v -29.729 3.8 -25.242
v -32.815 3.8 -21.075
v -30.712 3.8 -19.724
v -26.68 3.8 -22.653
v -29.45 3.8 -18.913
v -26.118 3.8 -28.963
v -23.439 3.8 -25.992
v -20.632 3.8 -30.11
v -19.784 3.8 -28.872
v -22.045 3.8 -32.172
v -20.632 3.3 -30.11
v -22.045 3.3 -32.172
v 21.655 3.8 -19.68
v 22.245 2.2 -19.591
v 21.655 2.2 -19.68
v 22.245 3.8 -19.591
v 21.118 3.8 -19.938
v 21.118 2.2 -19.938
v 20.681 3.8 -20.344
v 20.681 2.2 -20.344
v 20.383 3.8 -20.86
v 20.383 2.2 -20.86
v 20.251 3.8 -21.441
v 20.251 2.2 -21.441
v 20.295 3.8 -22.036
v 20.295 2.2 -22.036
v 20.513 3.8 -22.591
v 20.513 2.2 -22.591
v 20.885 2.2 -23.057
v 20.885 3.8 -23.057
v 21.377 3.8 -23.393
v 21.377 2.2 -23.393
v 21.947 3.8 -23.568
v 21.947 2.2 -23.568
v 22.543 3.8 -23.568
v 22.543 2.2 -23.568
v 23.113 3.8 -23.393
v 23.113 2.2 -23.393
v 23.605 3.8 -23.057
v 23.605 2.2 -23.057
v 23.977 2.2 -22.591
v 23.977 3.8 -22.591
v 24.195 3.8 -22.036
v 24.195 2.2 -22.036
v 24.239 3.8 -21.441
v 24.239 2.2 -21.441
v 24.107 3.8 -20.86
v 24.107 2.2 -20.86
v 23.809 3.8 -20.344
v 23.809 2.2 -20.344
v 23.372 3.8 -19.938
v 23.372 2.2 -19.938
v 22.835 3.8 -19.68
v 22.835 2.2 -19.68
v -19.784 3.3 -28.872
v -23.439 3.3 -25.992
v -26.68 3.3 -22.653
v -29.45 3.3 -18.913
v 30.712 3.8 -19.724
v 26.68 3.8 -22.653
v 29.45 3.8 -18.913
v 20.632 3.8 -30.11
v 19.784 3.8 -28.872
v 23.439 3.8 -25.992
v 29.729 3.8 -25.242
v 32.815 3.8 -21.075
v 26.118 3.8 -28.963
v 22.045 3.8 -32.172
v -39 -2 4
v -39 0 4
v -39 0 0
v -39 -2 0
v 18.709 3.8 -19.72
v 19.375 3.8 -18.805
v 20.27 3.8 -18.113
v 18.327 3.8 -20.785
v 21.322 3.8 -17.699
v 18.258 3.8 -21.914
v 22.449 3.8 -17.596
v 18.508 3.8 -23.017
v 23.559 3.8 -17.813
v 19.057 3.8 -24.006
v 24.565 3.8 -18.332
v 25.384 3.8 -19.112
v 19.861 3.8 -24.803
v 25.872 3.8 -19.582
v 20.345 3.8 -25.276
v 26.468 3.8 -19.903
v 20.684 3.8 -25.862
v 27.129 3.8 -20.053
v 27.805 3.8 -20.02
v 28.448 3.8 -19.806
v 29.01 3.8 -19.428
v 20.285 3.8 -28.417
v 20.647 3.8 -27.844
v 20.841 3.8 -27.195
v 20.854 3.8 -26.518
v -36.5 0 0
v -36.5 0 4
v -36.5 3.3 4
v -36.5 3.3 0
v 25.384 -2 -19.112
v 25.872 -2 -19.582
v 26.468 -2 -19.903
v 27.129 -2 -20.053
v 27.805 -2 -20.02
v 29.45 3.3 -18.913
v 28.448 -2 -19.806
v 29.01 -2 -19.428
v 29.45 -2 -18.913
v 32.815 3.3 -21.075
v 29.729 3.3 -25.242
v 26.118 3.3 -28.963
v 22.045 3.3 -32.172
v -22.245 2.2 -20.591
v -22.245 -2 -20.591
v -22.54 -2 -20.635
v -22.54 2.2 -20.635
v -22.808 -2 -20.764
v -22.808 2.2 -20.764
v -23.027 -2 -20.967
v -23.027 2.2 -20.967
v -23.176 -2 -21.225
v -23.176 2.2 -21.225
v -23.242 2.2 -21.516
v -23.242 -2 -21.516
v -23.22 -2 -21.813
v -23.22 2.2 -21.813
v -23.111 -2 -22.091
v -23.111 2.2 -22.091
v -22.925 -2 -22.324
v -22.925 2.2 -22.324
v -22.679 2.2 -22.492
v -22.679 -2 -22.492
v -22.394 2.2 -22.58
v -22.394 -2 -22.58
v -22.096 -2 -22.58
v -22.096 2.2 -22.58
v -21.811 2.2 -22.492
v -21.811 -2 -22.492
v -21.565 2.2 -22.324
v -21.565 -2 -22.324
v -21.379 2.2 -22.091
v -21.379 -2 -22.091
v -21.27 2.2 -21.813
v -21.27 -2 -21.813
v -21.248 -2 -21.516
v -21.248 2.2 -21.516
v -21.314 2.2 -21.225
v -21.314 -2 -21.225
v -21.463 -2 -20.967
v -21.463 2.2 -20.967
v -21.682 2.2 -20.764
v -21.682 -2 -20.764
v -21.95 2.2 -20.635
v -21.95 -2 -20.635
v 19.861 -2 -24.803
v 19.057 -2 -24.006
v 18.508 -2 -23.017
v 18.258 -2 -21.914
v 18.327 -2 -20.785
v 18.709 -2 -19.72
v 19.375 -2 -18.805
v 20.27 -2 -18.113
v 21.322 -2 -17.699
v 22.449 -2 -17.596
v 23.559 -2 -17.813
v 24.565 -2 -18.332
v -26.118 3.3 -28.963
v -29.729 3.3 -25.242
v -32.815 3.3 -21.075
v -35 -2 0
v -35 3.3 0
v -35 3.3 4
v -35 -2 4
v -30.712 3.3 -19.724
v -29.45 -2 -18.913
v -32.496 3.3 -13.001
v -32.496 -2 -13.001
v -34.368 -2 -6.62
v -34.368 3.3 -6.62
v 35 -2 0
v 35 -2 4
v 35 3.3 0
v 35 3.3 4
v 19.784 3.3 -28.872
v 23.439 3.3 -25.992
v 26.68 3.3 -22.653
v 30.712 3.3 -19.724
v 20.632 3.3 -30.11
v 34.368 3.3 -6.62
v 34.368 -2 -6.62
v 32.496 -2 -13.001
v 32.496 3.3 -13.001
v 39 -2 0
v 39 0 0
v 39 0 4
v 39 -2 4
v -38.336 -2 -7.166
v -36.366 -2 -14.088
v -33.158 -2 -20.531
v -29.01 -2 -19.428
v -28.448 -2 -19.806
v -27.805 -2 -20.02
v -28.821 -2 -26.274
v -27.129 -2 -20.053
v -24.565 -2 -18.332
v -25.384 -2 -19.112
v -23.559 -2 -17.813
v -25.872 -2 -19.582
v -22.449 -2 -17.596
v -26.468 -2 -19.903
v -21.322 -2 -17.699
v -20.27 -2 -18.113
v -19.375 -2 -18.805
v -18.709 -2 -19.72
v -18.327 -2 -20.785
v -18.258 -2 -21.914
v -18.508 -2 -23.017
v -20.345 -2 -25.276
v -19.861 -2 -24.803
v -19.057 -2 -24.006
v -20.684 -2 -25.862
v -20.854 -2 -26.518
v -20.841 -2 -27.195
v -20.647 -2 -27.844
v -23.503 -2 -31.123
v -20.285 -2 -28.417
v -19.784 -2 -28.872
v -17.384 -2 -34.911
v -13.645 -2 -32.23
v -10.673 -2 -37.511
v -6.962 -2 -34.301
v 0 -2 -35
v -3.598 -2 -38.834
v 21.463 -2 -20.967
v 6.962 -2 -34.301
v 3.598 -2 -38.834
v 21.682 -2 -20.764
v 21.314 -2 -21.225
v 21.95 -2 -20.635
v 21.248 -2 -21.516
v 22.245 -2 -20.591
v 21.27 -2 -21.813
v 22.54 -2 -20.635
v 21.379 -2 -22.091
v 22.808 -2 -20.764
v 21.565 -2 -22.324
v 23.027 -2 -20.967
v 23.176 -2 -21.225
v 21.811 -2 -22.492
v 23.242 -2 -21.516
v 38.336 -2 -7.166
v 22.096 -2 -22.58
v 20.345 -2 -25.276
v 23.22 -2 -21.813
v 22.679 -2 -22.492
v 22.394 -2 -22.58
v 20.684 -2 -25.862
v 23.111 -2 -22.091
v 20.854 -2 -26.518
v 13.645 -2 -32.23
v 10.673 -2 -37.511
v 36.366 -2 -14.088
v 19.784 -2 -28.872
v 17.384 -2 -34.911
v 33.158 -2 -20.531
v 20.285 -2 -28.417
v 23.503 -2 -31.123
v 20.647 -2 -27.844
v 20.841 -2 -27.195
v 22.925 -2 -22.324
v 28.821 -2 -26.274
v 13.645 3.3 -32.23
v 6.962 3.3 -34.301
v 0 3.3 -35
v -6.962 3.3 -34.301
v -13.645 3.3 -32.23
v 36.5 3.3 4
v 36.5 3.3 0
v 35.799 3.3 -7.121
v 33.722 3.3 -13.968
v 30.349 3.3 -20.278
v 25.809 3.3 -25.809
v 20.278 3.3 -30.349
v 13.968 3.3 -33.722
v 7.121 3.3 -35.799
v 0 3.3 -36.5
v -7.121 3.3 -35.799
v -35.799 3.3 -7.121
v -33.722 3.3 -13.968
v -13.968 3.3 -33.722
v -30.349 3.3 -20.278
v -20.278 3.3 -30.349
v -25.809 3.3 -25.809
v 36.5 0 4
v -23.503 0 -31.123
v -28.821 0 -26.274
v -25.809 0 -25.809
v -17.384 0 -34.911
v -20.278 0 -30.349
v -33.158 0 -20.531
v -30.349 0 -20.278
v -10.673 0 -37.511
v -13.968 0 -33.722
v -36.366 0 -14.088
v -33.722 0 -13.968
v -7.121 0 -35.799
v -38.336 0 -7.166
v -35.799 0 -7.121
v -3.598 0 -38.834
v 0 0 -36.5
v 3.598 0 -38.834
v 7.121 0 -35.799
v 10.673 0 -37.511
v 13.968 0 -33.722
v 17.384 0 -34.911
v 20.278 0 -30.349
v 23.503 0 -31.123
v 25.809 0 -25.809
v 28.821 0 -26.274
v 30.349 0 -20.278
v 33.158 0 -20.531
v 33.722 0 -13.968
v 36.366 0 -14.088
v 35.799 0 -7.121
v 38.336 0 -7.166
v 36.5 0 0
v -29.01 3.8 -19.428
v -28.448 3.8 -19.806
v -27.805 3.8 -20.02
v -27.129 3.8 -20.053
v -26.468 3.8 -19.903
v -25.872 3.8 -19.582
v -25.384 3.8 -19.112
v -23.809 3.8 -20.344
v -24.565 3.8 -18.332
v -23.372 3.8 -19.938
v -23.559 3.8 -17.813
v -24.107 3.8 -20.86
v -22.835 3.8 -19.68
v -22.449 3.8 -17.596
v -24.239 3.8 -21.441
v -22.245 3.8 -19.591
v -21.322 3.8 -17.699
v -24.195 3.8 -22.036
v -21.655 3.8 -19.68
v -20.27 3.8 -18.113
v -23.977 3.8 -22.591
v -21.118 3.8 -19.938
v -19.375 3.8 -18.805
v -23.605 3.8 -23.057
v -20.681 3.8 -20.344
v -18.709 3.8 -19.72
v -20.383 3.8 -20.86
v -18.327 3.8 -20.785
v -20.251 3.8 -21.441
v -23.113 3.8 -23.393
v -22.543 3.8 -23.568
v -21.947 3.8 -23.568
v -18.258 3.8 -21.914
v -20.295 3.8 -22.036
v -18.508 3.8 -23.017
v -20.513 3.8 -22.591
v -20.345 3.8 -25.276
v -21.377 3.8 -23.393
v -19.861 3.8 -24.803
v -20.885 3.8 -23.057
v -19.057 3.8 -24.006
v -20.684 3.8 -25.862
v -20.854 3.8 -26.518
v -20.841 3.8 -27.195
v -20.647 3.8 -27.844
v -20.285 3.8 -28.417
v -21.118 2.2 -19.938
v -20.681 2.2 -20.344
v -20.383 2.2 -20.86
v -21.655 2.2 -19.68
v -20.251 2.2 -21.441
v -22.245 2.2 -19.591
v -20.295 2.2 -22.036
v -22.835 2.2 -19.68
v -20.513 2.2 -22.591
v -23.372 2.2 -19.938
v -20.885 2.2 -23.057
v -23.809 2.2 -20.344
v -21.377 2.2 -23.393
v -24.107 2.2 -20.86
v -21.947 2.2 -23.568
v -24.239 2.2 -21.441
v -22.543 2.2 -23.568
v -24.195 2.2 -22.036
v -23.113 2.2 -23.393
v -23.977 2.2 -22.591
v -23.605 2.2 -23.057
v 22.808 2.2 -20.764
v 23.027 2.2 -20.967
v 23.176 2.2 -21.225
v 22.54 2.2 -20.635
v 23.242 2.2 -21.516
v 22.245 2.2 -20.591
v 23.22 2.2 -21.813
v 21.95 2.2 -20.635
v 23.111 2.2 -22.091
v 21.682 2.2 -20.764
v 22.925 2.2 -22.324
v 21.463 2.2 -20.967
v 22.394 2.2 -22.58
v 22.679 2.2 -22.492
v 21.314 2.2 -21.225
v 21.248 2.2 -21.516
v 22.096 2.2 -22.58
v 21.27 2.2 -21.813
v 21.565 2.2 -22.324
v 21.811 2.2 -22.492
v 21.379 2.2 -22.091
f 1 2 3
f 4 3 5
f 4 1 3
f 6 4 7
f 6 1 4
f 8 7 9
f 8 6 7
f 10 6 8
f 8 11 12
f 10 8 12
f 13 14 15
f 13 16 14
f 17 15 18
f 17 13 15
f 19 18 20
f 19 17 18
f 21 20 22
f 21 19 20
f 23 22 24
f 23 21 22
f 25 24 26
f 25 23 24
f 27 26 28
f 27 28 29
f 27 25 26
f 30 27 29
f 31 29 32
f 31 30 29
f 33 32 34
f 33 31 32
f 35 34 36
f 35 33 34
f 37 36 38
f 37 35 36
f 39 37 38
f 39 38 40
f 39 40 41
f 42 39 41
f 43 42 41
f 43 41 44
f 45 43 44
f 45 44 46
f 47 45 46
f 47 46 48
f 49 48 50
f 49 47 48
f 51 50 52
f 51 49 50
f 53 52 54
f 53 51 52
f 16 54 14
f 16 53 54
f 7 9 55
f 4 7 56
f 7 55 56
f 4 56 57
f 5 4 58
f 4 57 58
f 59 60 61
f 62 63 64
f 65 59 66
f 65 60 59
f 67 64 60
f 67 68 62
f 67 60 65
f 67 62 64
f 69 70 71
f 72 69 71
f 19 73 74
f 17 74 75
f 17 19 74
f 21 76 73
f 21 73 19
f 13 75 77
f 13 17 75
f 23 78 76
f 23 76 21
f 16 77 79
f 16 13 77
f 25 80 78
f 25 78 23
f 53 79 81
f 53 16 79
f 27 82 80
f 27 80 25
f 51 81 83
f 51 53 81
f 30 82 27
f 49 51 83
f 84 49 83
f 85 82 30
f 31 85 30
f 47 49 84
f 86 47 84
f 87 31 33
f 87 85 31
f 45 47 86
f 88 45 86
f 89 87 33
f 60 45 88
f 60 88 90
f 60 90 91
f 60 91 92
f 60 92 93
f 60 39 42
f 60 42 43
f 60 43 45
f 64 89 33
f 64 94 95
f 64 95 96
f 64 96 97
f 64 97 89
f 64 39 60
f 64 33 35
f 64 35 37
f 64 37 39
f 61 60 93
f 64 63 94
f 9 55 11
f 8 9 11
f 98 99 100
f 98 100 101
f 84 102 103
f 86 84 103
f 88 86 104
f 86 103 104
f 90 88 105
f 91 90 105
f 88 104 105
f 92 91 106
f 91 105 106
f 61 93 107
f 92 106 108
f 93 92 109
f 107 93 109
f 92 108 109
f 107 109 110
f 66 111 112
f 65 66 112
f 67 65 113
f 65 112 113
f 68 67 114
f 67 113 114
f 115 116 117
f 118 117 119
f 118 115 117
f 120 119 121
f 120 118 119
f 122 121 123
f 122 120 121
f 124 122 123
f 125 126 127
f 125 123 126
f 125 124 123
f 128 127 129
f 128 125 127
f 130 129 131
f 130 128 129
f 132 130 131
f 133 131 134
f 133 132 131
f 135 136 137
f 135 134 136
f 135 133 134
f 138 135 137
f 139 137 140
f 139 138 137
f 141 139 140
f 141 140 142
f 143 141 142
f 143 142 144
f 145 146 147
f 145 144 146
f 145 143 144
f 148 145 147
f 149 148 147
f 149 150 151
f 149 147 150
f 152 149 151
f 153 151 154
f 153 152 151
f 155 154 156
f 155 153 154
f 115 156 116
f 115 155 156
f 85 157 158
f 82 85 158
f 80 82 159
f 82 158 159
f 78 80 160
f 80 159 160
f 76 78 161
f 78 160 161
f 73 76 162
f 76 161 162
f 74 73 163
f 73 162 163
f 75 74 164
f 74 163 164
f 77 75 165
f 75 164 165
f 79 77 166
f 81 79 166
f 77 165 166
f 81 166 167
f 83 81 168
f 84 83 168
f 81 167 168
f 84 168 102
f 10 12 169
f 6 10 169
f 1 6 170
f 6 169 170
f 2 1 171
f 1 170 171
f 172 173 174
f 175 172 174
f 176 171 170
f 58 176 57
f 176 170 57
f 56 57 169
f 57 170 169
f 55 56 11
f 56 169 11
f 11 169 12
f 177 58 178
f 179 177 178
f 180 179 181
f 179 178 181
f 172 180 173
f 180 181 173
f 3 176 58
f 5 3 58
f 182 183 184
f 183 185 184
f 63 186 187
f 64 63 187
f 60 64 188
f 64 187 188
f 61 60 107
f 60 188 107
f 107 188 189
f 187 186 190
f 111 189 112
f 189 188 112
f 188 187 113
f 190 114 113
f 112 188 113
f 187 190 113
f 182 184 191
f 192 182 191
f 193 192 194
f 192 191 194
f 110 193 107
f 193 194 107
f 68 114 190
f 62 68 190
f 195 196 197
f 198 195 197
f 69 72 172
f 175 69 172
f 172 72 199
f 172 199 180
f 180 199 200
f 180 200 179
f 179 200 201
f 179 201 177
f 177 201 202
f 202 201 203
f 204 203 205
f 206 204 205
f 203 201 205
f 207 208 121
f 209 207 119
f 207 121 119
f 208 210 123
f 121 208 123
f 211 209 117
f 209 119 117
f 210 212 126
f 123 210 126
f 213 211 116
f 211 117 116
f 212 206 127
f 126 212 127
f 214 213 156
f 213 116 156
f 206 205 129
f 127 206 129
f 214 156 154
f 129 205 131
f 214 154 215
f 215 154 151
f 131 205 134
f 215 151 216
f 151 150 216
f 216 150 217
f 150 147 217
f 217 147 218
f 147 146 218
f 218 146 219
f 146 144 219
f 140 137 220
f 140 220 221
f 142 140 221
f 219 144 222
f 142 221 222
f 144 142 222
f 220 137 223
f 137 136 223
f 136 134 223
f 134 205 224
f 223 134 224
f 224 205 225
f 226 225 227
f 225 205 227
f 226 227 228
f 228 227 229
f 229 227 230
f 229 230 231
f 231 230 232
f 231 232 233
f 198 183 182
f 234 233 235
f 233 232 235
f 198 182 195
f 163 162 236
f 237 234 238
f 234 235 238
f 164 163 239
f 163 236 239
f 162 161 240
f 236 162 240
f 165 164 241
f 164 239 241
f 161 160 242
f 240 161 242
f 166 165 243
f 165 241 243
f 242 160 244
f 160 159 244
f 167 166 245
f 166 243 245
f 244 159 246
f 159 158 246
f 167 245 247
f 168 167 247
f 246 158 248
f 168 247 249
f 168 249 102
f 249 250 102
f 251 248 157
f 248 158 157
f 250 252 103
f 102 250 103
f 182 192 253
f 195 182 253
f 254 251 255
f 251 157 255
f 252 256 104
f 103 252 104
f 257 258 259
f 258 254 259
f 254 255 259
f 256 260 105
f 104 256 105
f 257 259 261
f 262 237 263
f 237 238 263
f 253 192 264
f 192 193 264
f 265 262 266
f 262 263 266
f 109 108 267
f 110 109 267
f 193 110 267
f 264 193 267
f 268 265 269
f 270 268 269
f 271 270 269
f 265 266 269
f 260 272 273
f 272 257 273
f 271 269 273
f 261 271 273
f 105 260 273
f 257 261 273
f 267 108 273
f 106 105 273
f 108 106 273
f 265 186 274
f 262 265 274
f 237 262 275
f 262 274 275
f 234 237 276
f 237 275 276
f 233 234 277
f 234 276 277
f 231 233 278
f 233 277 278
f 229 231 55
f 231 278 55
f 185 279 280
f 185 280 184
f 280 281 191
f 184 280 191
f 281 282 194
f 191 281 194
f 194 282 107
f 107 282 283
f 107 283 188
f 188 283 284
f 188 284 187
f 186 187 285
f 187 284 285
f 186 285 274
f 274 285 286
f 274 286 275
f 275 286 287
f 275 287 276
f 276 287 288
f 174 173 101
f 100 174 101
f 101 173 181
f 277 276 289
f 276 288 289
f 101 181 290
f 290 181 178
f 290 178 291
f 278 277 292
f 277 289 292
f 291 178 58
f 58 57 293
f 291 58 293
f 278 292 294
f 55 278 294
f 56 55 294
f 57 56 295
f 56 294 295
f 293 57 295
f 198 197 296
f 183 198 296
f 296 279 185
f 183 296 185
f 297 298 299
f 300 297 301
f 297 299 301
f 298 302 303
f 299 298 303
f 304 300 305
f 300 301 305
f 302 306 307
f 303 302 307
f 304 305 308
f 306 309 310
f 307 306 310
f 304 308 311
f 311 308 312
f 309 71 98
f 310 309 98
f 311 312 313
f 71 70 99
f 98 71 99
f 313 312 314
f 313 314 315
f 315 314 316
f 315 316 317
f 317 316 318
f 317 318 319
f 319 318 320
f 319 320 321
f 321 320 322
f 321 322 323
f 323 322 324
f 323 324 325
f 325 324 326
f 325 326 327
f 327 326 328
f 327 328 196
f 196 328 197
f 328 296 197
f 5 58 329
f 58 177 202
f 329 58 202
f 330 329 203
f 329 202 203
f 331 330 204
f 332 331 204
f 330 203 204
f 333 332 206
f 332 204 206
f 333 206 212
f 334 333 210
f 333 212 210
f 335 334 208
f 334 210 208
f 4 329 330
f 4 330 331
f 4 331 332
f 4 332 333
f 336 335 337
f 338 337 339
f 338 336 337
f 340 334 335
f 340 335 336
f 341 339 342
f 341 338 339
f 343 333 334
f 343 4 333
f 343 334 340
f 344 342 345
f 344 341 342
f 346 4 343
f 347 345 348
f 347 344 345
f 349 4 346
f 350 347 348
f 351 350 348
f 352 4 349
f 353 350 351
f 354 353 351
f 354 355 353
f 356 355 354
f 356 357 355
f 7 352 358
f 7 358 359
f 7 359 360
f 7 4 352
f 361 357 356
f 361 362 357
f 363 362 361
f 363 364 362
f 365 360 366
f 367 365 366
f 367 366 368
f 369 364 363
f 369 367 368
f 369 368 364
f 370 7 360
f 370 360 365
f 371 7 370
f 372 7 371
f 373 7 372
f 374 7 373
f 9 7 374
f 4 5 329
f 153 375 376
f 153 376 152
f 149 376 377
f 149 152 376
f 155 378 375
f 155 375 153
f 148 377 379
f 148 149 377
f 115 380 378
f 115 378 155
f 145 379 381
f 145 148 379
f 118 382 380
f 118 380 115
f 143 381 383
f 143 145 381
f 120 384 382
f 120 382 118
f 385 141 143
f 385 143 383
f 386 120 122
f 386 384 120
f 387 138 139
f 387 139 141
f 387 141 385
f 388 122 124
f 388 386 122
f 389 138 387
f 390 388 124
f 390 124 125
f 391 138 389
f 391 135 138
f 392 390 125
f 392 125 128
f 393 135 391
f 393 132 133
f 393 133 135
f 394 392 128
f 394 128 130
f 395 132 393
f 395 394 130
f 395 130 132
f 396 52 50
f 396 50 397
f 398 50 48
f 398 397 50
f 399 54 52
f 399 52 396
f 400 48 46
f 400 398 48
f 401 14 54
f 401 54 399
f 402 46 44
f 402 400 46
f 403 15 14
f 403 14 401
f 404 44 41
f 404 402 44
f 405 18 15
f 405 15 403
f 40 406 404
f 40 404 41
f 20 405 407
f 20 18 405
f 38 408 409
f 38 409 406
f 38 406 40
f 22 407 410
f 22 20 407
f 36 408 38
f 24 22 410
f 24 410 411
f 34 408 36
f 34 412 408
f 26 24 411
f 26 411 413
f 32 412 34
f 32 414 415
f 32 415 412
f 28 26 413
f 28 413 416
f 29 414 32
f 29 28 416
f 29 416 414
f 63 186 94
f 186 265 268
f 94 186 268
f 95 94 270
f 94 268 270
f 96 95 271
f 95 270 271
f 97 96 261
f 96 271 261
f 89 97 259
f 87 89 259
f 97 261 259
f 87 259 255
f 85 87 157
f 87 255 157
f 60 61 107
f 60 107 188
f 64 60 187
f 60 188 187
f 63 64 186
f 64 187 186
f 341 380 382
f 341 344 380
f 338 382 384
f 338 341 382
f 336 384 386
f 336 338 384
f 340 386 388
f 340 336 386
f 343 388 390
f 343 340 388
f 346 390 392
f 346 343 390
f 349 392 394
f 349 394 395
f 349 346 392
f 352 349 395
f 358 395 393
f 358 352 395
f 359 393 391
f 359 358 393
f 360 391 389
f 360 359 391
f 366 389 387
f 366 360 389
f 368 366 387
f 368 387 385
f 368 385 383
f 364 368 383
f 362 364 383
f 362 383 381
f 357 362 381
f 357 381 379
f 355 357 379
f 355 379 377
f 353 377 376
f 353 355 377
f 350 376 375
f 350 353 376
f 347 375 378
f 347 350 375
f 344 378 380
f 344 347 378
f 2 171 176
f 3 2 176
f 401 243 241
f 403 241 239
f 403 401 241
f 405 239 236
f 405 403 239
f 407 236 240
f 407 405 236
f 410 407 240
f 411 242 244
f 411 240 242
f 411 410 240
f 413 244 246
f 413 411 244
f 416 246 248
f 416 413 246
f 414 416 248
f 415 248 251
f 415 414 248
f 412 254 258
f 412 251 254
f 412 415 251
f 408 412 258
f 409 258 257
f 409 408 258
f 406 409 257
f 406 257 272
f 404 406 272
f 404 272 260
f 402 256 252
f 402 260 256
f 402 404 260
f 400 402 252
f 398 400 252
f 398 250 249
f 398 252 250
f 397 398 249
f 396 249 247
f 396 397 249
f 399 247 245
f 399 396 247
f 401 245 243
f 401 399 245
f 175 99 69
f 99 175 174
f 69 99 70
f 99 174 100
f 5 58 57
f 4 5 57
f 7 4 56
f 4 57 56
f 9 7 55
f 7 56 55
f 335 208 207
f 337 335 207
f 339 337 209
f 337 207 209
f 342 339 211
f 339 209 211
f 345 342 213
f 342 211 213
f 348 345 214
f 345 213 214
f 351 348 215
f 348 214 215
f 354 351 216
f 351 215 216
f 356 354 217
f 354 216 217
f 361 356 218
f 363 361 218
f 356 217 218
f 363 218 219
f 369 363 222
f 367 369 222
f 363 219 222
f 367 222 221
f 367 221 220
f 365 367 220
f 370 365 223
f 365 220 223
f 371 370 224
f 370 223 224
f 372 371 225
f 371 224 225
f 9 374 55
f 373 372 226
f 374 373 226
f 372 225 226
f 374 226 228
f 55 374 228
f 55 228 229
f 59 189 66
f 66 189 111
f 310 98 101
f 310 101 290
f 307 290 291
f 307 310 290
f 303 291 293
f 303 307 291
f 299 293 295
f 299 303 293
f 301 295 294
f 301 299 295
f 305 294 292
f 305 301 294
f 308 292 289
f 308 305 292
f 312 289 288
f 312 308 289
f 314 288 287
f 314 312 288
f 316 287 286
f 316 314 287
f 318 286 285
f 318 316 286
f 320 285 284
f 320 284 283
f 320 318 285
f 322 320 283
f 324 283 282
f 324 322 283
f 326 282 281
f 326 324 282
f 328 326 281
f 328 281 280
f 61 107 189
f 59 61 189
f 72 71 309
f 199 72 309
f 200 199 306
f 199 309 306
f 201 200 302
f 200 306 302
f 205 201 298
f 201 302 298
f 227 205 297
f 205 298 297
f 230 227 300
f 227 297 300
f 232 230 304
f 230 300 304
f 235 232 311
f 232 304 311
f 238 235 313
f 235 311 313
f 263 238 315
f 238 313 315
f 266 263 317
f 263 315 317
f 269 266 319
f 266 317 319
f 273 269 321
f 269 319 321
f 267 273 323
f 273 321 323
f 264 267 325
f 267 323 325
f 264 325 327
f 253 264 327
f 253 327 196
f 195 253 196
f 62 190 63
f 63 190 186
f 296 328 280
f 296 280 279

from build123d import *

# Parameters (mm, degrees)
BOSS_EXTRUDE1_DEPTH                     = 3.3
BOSS_EXTRUDE2_DEPTH                     = 2
BOSS_EXTRUDE3_DEPTH                     = 0.5
BOSS_EXTRUDE3_DEPTH_BACK                = 5.3
BOSS_EXTRUDE4_DEPTH                     = 0.5
CBORE_FOR_M2_PAN_HEAD_SCREW2_AT_2_COUNT = 2
CBORE_FOR_M2_PAN_HEAD_SCREW2_AT_2_PITCH = 44.490002881


with BuildPart() as part:
    # Sketch1 → Boss-Extrude1 (new body)
    with BuildSketch(Plane(origin=(0, 0, 0), x_dir=(1, 0, 0), z_dir=(0, 1, 0))):
        with BuildLine():
            Line((36.5, 0), (36.5, -4))
            Line((36.5, -4), (35, -4))
            Line((35, -4), (35, 0))
            ThreePointArc((35, 0), (0, 35), (-35, 0))
            Line((-35, 0), (-35, -4))
            Line((-35, -4), (-36.5, -4))
            Line((-36.5, -4), (-36.5, 0))
            ThreePointArc((-36.5, 0), (0, 36.5), (36.5, 0))
        make_face()
    extrude(amount=BOSS_EXTRUDE1_DEPTH)



with BuildPart() as body_2:
    # Sketch2 → Boss-Extrude2 (new body)
    with BuildSketch(Plane.XZ):
        with BuildLine():
            Line((-36.5, 0), (-36.5, 4))
            Line((-36.5, 4), (-39, 4))
            Line((-39, 4), (-39, 0))
            ThreePointArc((-39, 0), (0, -39), (39, 0))
            Line((39, 0), (39, 4))
            Line((39, 4), (36.5, 4))
            Line((36.5, 4), (36.5, 0))
            ThreePointArc((36.5, 0), (0, -36.5), (-36.5, 0))
        make_face()
        with BuildLine():
            Line((-36.5, 4), (-36.5, 0))
            ThreePointArc((-36.5, 0), (0, -36.5), (36.5, 0))
            Line((36.5, 0), (36.5, 4))
            Line((36.5, 4), (35, 4))
            Line((35, 4), (35, 0))
            ThreePointArc((35, 0), (0, -35), (-35, 0))
            Line((-35, 0), (-35, 4))
            Line((-35, 4), (-36.5, 4))
        make_face()
    extrude(amount=BOSS_EXTRUDE2_DEPTH)


with BuildPart() as part_1:
    add(part.part)

    add(body_2.part)  # Boss-Extrude3 merges body 2
    # Sketch3 → Boss-Extrude3 (add, two sides: drawn at the far end of the back side and taken through both)
    with BuildSketch(Plane(origin=(0, 3.3, 0), x_dir=(1, 0, 0), z_dir=(0, 1, 0)).offset(-BOSS_EXTRUDE3_DEPTH_BACK)):
        with BuildLine():
            ThreePointArc((-29.449739277, 18.913298404), (-27.468060754, 20.059376083), (-25.384192229, 19.111728585))
            ThreePointArc((-25.384192229, 19.111728585), (-19.374678674, 18.804835184), (-19.860783886, 24.802512938))
            ThreePointArc((-19.860783886, 24.802512938), (-20.870200446, 26.857171552), (-19.783774677, 28.872171022))
            ThreePointArc((-19.783774677, 28.872171022), (-25.115324207, 24.376638201), (-29.449739277, 18.913298404))
        make_face()
        with BuildLine():
            ThreePointArc((29.449739277, 18.913298404), (25.115324207, 24.376638201), (19.783774677, 28.872171022))
            ThreePointArc((19.783774677, 28.872171022), (20.870200446, 26.857171552), (19.860783886, 24.802512938))
            ThreePointArc((19.860783886, 24.802512938), (19.374678674, 18.804835184), (25.384192229, 19.111728585))
            ThreePointArc((25.384192229, 19.111728585), (27.468060754, 20.059376083), (29.449739277, 18.913298404))
        make_face()
    extrude(amount=BOSS_EXTRUDE3_DEPTH + BOSS_EXTRUDE3_DEPTH_BACK)

    # Sketch11 → CBORE for M2 Pan Head Screw2 (revolve, cut)
    with BuildSketch(Plane(origin=(-22.24500144, 3.8, -21.590736692), x_dir=(0, 0, 1), z_dir=(1, 0, 0))):
        Polygon((0, 0), (0, 30.600860619), (1, 30), (1, 1.6), (2, 1.6), (2, 0), align=None)
    cbore_for_m2_pan_head_screw2 = revolve(axis=Axis((-22.24500144, 10.15, -21.590736692), (0, -1, 0)), mode=Mode.SUBTRACT)

    # CBORE for M2 Pan Head Screw2 at 2: CBORE for M2 Pan Head Screw2 ×2
    with Locations(*[(i * CBORE_FOR_M2_PAN_HEAD_SCREW2_AT_2_PITCH, 0, 0) for i in range(1, CBORE_FOR_M2_PAN_HEAD_SCREW2_AT_2_COUNT)]):
        add(cbore_for_m2_pan_head_screw2, mode=Mode.SUBTRACT)


with BuildPart() as body_2_2:
    # Sketch9 → Boss-Extrude4 (new body)
    with BuildSketch(Plane(origin=(0, 3.3, 0), x_dir=(1, 0, 0), z_dir=(0, 1, 0))):
        with BuildLine():
            Line((-32.815423766, 21.074818222), (-30.71187096, 19.723868336))
            ThreePointArc((-30.71187096, 19.723868336), (-26.191695244, 25.421351267), (-20.631650735, 30.10954978))
            Line((-20.631650735, 30.10954978), (-22.044777498, 32.17184771))
            ThreePointArc((-22.044777498, 32.17184771), (-27.985646974, 27.16253971), (-32.815423766, 21.074818222))
        make_face()
        with BuildLine():
            Line((-30.71187096, 19.723868336), (-29.449739277, 18.913298404))
            ThreePointArc((-29.449739277, 18.913298404), (-25.115324207, 24.376638201), (-19.783774677, 28.872171022))
            Line((-19.783774677, 28.872171022), (-20.631650735, 30.10954978))
            ThreePointArc((-20.631650735, 30.10954978), (-26.191695244, 25.421351267), (-30.71187096, 19.723868336))
        make_face()
        with BuildLine():
            ThreePointArc((30.71187096, 19.723868336), (26.191695244, 25.421351267), (20.631650735, 30.10954978))
            Line((20.631650735, 30.10954978), (19.783774677, 28.872171022))
            ThreePointArc((19.783774677, 28.872171022), (25.115324207, 24.376638201), (29.449739277, 18.913298404))
            Line((29.449739277, 18.913298404), (30.71187096, 19.723868336))
        make_face()
        with BuildLine():
            Line((22.044777498, 32.17184771), (20.631650735, 30.10954978))
            ThreePointArc((20.631650735, 30.10954978), (26.191695244, 25.421351267), (30.71187096, 19.723868336))
            Line((30.71187096, 19.723868336), (32.815423766, 21.074818222))
            ThreePointArc((32.815423766, 21.074818222), (27.985646974, 27.16253971), (22.044777498, 32.17184771))
        make_face()
    extrude(amount=BOSS_EXTRUDE4_DEPTH)


solid = Compound([part_1.part, body_2_2.part])
